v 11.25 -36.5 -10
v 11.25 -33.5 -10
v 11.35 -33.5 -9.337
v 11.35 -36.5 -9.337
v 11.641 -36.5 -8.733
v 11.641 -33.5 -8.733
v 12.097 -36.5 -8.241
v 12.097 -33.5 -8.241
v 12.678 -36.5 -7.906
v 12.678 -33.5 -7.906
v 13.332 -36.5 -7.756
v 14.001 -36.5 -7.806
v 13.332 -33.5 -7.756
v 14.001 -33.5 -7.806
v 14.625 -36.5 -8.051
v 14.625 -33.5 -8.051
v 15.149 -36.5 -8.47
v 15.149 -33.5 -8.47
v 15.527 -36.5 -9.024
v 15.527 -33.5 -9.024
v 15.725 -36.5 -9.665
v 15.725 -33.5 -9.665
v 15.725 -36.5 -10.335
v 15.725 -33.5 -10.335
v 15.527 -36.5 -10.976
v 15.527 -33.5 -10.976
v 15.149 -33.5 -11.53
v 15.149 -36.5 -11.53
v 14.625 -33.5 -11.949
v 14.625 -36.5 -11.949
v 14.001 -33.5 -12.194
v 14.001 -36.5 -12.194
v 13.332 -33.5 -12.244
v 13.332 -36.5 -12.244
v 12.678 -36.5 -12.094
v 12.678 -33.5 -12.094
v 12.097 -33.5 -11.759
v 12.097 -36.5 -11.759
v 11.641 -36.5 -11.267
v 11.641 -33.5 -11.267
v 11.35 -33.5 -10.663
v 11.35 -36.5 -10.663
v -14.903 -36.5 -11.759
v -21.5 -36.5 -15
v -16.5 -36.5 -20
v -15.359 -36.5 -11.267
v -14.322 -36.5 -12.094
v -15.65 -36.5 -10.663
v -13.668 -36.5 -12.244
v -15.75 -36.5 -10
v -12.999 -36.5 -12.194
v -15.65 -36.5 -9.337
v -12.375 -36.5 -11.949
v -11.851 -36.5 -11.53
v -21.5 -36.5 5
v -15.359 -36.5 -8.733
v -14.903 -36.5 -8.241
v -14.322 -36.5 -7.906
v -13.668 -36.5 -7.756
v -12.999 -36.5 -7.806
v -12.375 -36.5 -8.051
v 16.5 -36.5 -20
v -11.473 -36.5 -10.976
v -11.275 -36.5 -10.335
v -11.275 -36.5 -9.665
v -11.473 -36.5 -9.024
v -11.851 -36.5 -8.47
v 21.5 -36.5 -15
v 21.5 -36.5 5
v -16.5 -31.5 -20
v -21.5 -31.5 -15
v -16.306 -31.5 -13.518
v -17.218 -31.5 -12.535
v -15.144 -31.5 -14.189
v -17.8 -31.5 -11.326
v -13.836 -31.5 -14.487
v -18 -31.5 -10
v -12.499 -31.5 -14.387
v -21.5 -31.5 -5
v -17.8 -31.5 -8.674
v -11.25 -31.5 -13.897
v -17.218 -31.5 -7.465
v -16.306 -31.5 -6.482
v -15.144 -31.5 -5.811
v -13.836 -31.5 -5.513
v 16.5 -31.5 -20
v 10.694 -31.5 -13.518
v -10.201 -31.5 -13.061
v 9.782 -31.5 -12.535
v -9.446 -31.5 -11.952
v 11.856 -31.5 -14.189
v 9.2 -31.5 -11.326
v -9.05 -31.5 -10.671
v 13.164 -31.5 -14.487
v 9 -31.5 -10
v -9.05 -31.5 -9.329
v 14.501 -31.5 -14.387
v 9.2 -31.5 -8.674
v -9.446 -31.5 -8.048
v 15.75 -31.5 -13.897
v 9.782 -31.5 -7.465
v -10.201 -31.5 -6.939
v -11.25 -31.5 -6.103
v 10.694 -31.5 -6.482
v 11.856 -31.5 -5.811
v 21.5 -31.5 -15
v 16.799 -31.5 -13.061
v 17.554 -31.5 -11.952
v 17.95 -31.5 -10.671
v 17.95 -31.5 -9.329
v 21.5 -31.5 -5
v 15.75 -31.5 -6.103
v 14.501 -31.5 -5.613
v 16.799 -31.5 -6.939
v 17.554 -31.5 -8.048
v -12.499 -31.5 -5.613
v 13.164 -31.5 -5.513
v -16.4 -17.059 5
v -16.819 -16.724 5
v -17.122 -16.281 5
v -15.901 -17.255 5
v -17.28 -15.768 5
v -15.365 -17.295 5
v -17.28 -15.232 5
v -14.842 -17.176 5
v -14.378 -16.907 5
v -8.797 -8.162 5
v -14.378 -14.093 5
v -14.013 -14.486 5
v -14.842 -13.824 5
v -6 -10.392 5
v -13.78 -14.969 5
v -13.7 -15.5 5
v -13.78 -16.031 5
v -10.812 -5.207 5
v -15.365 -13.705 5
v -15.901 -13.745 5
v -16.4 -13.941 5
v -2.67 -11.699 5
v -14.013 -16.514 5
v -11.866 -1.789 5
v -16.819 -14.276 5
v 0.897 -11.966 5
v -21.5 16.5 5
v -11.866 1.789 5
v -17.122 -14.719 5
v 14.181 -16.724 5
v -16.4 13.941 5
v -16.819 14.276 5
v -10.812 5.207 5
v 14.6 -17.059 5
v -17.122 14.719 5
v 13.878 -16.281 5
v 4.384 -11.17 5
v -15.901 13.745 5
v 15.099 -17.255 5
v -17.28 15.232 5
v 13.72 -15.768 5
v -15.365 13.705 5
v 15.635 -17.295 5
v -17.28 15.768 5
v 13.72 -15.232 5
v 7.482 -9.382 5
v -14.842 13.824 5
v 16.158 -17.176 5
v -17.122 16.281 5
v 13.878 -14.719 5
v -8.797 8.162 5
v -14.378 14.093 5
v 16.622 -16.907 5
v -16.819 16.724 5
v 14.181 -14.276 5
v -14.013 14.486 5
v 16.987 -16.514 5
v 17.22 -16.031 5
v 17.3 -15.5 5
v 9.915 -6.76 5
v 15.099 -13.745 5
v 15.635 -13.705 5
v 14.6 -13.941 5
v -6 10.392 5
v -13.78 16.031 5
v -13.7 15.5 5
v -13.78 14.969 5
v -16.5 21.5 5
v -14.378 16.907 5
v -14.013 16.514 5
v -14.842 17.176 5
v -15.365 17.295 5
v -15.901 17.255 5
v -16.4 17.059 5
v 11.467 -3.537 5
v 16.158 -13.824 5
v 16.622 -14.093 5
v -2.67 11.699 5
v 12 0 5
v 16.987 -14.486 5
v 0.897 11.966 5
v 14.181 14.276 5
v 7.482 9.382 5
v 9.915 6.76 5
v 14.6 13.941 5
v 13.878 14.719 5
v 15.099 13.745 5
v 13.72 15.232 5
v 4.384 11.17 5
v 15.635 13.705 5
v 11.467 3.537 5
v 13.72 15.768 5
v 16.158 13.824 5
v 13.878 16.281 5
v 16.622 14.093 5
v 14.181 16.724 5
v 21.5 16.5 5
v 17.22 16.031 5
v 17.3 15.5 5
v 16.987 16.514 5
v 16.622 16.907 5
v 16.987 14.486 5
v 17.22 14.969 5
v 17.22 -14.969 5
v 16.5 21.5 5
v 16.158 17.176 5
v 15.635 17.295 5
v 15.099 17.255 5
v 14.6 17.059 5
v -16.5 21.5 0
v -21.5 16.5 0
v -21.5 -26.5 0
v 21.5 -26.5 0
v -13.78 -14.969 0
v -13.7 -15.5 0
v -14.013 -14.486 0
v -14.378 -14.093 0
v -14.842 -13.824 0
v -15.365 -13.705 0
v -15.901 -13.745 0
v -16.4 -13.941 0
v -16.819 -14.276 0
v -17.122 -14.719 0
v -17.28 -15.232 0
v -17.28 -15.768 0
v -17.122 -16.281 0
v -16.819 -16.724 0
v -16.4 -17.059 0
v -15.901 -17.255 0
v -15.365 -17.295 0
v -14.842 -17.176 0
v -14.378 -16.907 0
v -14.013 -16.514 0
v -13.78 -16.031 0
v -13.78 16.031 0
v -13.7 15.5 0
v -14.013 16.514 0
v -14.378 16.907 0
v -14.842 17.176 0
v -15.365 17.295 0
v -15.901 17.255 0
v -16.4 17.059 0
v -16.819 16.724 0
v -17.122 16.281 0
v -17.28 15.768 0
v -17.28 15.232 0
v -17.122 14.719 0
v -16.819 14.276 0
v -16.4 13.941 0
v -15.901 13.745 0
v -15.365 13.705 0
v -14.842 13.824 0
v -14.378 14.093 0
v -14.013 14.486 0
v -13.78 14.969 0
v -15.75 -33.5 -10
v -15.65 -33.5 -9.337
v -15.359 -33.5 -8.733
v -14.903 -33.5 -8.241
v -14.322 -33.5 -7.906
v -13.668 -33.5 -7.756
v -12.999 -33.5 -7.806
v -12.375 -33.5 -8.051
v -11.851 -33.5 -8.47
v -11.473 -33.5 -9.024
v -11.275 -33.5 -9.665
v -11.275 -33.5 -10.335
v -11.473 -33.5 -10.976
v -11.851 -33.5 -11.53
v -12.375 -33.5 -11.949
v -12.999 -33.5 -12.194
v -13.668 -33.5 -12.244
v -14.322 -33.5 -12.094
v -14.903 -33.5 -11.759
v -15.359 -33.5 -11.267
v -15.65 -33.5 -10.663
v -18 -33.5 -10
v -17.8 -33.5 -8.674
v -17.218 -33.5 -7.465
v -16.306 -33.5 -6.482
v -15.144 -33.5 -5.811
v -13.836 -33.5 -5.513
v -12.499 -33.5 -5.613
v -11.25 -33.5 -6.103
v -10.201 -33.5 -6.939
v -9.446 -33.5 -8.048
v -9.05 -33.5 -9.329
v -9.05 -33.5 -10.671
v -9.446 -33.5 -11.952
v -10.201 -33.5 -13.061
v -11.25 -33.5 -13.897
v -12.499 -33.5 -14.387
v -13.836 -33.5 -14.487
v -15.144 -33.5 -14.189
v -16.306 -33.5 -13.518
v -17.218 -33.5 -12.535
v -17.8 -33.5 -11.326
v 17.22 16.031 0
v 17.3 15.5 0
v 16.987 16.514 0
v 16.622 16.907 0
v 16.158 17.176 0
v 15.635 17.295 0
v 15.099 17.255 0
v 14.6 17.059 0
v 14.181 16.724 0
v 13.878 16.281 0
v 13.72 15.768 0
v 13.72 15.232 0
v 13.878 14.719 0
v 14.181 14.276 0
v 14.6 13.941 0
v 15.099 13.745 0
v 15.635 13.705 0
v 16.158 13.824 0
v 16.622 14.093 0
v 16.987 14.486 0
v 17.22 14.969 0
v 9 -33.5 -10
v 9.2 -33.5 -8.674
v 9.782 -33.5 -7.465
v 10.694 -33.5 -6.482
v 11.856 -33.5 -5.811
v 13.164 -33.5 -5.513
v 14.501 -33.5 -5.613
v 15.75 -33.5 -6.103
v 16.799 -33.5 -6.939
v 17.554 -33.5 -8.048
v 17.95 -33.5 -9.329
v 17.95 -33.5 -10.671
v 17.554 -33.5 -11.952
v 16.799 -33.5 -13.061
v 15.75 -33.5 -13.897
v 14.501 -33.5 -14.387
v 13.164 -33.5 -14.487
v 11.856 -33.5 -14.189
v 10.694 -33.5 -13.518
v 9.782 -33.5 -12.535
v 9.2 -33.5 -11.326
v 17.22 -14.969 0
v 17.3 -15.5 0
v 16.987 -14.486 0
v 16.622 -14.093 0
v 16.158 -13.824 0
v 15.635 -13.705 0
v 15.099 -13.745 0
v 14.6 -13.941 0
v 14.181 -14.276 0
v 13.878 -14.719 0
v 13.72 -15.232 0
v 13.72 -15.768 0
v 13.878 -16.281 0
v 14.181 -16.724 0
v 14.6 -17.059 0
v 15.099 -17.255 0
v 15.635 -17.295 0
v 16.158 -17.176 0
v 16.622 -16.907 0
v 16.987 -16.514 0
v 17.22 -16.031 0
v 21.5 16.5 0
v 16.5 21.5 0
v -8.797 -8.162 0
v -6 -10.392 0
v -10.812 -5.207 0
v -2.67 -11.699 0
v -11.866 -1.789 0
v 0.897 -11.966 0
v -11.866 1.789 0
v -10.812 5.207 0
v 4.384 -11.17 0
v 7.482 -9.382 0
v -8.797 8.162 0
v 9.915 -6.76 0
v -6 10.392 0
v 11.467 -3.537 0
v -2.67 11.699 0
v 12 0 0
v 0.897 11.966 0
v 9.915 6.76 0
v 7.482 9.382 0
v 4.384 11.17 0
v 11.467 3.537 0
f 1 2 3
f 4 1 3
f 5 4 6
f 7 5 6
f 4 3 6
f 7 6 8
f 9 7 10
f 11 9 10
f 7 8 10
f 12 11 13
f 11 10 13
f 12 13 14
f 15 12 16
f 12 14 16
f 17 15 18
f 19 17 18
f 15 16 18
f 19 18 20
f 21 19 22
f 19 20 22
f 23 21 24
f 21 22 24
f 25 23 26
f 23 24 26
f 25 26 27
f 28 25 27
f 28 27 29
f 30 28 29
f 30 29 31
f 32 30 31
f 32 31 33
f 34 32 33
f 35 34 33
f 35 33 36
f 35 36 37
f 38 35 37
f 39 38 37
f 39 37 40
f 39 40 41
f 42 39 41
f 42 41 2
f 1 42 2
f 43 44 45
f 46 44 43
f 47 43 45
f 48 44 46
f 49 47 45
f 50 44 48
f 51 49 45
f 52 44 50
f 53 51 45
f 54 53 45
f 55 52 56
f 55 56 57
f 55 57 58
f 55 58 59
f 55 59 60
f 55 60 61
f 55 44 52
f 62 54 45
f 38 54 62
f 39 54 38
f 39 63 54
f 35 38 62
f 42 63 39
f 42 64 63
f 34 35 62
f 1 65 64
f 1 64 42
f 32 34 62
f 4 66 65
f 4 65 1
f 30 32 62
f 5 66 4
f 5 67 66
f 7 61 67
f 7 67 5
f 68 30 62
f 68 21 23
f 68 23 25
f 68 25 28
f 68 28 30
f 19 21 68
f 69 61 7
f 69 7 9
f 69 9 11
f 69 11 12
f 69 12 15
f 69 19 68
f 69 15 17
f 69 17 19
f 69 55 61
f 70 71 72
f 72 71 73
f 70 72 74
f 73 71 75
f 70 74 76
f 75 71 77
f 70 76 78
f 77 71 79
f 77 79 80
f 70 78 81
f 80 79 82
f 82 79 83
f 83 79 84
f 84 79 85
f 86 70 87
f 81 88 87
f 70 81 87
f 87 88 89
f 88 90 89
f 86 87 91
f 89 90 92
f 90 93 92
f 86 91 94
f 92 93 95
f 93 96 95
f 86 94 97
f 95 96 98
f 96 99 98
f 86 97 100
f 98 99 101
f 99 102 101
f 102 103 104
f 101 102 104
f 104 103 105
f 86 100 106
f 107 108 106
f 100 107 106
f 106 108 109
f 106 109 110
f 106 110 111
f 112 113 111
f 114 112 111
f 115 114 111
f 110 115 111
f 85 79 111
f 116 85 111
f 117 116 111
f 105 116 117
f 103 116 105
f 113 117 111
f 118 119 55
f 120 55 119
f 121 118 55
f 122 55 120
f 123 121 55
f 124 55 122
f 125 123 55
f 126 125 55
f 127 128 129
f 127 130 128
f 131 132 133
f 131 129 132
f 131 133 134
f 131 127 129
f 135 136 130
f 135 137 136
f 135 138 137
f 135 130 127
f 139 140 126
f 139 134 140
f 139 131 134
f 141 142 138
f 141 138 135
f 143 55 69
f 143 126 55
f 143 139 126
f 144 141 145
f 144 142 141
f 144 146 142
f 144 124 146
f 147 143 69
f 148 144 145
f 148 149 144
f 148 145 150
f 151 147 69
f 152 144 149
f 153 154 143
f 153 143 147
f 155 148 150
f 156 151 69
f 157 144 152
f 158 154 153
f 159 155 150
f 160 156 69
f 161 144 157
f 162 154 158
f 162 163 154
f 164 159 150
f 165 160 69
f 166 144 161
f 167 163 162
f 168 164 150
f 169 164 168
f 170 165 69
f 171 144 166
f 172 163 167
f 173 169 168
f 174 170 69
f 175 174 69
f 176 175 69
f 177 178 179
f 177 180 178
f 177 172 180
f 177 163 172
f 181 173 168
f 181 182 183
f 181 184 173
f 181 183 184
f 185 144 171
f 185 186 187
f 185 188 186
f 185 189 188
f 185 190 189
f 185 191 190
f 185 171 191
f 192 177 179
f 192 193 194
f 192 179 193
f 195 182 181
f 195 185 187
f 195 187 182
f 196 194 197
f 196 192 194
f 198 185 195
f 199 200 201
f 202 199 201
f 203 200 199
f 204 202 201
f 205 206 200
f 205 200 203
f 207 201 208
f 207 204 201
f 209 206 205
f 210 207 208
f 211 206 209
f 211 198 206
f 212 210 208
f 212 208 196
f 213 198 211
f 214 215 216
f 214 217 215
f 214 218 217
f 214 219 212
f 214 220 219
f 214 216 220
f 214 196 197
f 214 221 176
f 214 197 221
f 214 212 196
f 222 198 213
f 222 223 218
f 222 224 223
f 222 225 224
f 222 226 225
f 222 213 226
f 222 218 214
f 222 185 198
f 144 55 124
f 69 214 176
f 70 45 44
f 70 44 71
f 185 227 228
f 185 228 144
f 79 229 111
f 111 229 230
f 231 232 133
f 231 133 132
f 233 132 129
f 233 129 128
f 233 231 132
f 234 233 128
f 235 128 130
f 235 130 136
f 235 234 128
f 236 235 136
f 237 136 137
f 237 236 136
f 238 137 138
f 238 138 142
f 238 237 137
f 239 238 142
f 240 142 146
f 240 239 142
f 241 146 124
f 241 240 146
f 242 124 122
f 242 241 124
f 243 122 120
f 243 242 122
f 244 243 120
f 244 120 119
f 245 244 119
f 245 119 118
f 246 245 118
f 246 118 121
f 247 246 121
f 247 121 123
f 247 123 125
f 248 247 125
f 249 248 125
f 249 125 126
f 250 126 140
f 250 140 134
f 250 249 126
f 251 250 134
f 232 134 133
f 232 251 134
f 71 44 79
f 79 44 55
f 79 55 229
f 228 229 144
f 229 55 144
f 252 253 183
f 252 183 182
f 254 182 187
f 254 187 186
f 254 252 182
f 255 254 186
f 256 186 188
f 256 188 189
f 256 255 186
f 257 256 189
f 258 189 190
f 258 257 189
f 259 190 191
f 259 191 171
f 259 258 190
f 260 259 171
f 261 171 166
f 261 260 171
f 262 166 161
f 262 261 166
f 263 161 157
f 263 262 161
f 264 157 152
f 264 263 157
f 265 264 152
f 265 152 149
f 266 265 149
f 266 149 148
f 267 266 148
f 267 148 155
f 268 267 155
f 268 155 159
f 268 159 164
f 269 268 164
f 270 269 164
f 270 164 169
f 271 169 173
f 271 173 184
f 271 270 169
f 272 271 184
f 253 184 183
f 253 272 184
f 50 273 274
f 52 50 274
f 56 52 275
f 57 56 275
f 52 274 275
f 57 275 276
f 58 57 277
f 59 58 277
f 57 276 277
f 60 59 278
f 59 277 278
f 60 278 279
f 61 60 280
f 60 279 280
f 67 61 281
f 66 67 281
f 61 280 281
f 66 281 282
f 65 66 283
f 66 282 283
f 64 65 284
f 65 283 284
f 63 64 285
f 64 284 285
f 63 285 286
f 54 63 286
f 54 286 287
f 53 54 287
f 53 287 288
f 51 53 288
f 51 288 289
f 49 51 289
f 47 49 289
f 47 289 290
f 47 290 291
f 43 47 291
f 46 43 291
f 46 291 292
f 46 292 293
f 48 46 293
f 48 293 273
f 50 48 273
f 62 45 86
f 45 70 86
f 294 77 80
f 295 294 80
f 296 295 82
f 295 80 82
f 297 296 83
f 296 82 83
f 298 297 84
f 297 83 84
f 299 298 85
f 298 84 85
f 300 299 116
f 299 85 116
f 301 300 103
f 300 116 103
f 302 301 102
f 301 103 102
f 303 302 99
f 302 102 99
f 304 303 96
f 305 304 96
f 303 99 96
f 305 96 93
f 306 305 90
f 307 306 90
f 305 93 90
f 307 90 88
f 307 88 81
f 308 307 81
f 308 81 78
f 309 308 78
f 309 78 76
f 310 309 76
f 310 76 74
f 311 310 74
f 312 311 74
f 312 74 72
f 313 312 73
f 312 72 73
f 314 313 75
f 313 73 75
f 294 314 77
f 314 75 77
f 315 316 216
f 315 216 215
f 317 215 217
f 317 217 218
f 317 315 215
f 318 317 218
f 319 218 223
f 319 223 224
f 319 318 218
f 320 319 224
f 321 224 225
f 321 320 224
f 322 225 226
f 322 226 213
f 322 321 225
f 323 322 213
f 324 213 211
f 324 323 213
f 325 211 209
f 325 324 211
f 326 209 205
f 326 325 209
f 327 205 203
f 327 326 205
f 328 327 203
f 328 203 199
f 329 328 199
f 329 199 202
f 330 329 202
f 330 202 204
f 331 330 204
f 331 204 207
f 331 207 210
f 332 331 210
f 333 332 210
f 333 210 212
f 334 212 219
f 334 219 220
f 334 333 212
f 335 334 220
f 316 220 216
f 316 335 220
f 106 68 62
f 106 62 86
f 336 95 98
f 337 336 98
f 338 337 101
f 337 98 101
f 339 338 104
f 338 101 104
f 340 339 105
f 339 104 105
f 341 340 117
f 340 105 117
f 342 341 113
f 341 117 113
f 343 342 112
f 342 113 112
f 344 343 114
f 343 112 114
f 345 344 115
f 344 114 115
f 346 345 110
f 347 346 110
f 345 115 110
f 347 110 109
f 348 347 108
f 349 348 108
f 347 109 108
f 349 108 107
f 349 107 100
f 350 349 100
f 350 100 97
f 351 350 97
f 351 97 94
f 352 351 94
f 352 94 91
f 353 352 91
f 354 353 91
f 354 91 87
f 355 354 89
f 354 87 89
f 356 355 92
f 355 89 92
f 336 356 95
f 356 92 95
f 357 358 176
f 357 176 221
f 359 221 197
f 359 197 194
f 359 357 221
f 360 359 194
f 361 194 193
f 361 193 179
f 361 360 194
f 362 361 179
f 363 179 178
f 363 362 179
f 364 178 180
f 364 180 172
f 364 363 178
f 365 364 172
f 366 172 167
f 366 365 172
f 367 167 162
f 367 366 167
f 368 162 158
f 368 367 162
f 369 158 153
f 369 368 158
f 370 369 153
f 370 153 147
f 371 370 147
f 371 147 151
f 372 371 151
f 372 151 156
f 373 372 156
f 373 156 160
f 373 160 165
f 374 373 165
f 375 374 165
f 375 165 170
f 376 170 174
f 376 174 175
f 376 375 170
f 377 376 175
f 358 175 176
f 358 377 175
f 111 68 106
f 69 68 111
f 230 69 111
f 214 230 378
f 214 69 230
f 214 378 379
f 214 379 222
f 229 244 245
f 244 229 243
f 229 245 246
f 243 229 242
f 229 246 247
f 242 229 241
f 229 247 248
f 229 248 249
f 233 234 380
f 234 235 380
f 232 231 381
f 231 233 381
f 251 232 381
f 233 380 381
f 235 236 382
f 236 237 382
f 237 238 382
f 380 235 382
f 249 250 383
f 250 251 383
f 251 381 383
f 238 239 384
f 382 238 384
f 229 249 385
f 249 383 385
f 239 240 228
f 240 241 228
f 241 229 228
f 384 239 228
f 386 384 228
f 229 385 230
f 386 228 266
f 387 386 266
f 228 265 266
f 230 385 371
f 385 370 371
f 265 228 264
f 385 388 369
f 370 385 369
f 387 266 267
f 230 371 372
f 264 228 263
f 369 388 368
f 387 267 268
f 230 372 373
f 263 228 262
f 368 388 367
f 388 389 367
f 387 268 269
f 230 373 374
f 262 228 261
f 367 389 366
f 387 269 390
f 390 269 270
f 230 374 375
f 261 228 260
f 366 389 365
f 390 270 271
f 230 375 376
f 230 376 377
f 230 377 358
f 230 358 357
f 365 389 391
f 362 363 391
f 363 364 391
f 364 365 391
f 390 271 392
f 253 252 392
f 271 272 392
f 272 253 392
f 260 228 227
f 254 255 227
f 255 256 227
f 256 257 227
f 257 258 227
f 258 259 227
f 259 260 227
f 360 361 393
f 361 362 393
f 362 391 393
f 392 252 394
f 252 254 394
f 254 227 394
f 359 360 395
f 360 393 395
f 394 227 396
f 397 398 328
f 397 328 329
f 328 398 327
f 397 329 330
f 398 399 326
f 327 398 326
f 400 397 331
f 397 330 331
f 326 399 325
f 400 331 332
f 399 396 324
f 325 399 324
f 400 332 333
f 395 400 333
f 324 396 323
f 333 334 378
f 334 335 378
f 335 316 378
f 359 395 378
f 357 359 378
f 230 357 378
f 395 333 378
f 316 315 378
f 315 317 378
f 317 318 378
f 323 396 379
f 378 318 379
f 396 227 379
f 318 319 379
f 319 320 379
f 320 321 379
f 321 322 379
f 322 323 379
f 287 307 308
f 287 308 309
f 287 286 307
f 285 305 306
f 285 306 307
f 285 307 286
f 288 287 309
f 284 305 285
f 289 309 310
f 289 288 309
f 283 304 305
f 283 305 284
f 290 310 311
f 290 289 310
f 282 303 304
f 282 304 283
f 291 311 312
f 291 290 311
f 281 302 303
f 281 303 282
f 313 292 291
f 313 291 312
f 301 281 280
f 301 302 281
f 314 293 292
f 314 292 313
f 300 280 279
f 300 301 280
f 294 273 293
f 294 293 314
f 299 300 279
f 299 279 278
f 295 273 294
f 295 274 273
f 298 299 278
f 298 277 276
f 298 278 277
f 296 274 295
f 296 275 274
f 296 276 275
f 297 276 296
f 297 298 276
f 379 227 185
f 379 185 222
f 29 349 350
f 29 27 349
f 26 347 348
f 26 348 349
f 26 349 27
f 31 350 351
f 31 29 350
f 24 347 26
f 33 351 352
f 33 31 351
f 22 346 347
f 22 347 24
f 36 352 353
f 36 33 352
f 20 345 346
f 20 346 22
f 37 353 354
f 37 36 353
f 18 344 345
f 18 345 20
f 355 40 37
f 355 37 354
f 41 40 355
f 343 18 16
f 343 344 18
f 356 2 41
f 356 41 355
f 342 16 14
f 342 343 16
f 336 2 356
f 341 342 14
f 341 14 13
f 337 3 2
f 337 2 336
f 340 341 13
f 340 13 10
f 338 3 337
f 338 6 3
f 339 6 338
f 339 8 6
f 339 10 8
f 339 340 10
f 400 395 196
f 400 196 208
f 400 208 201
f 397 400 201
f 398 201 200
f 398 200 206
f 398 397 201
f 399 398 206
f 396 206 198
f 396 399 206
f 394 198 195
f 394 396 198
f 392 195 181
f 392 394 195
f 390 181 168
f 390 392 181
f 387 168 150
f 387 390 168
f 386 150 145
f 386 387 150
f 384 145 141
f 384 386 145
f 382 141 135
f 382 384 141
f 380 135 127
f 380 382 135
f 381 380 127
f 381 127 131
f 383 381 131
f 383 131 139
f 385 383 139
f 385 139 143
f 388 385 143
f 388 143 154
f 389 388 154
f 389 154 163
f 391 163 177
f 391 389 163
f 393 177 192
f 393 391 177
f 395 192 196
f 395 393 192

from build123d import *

# Parameters (mm, degrees)
F0_W          = 43
F0_H          = 43
F0_R          = 1.8
F0_R_2        = 12
F0_H_2        = 10
F1_DEPTH      = 5
F0_H_3        = 5
F2_DEPTH      = 5
F2_DEPTH_BACK = 20
F3_R          = 2.25
F4_DEPTH      = 5
F3_R_2        = 4.5
F5_DEPTH      = 2
F6_SIZE       = 5


with BuildPart() as f1:
    # F0 (on Top) → F1 (new body)
    with BuildSketch(Plane.XY):
        Rectangle(F0_W, F0_H)
        with Locations((-15.5, -15.5)):
            Circle(F0_R, mode=Mode.SUBTRACT)
        with Locations((15.5, -15.5)):
            Circle(F0_R, mode=Mode.SUBTRACT)
        with Locations((-15.5, 15.5)):
            Circle(F0_R, mode=Mode.SUBTRACT)
        Circle(F0_R_2, mode=Mode.SUBTRACT)
        with Locations((15.5, 15.5)):
            Circle(F0_R, mode=Mode.SUBTRACT)
        with Locations((0, -26.5)):
            Rectangle(F0_W, F0_H_2)
    extrude(amount=F1_DEPTH)

    # F0 (on Top) → F2 (join, two sides)
    with BuildSketch(Plane.XY) as f2_sk:
        with Locations((0, -34)):
            Rectangle(F0_W, F0_H_3)
    extrude(amount=F2_DEPTH)
    extrude(f2_sk.sketch, amount=-F2_DEPTH_BACK)

    # F3 (on face) → F4 (cut, through all)
    with BuildSketch(Plane(origin=(0, -31.5, 0), x_dir=(-1, 0, 0), z_dir=(0, 1, 0))):
        with Locations((-13.5, -10)):
            Circle(F3_R)
        with Locations((13.5, -10)):
            Circle(F3_R)
    extrude(amount=-F4_DEPTH, mode=Mode.SUBTRACT)

    # F3 (on face) → F5 (cut)
    with BuildSketch(Plane(origin=(0, -31.5, 0), x_dir=(-1, 0, 0), z_dir=(0, 1, 0))):
        with Locations((-13.5, -10)):
            Circle(F3_R_2)
        with Locations((-13.5, -10)):
            Circle(F3_R, mode=Mode.SUBTRACT)
        with Locations((13.5, -10)):
            Circle(F3_R_2)
        with Locations((13.5, -10)):
            Circle(F3_R, mode=Mode.SUBTRACT)
    extrude(amount=-F5_DEPTH, mode=Mode.SUBTRACT)

    # F6
    f6_edges = [f1.edges().sort_by_distance(p)[0] for p in [
        (-21.5, 21.5, 2.5),
        (21.5, 21.5, 2.5),
        (-21.5, -34, -20),
        (21.5, -34, -20),
        (0, -31.5, 0),
    ]]
    chamfer(f6_edges, length=F6_SIZE)


solid = f1.part
